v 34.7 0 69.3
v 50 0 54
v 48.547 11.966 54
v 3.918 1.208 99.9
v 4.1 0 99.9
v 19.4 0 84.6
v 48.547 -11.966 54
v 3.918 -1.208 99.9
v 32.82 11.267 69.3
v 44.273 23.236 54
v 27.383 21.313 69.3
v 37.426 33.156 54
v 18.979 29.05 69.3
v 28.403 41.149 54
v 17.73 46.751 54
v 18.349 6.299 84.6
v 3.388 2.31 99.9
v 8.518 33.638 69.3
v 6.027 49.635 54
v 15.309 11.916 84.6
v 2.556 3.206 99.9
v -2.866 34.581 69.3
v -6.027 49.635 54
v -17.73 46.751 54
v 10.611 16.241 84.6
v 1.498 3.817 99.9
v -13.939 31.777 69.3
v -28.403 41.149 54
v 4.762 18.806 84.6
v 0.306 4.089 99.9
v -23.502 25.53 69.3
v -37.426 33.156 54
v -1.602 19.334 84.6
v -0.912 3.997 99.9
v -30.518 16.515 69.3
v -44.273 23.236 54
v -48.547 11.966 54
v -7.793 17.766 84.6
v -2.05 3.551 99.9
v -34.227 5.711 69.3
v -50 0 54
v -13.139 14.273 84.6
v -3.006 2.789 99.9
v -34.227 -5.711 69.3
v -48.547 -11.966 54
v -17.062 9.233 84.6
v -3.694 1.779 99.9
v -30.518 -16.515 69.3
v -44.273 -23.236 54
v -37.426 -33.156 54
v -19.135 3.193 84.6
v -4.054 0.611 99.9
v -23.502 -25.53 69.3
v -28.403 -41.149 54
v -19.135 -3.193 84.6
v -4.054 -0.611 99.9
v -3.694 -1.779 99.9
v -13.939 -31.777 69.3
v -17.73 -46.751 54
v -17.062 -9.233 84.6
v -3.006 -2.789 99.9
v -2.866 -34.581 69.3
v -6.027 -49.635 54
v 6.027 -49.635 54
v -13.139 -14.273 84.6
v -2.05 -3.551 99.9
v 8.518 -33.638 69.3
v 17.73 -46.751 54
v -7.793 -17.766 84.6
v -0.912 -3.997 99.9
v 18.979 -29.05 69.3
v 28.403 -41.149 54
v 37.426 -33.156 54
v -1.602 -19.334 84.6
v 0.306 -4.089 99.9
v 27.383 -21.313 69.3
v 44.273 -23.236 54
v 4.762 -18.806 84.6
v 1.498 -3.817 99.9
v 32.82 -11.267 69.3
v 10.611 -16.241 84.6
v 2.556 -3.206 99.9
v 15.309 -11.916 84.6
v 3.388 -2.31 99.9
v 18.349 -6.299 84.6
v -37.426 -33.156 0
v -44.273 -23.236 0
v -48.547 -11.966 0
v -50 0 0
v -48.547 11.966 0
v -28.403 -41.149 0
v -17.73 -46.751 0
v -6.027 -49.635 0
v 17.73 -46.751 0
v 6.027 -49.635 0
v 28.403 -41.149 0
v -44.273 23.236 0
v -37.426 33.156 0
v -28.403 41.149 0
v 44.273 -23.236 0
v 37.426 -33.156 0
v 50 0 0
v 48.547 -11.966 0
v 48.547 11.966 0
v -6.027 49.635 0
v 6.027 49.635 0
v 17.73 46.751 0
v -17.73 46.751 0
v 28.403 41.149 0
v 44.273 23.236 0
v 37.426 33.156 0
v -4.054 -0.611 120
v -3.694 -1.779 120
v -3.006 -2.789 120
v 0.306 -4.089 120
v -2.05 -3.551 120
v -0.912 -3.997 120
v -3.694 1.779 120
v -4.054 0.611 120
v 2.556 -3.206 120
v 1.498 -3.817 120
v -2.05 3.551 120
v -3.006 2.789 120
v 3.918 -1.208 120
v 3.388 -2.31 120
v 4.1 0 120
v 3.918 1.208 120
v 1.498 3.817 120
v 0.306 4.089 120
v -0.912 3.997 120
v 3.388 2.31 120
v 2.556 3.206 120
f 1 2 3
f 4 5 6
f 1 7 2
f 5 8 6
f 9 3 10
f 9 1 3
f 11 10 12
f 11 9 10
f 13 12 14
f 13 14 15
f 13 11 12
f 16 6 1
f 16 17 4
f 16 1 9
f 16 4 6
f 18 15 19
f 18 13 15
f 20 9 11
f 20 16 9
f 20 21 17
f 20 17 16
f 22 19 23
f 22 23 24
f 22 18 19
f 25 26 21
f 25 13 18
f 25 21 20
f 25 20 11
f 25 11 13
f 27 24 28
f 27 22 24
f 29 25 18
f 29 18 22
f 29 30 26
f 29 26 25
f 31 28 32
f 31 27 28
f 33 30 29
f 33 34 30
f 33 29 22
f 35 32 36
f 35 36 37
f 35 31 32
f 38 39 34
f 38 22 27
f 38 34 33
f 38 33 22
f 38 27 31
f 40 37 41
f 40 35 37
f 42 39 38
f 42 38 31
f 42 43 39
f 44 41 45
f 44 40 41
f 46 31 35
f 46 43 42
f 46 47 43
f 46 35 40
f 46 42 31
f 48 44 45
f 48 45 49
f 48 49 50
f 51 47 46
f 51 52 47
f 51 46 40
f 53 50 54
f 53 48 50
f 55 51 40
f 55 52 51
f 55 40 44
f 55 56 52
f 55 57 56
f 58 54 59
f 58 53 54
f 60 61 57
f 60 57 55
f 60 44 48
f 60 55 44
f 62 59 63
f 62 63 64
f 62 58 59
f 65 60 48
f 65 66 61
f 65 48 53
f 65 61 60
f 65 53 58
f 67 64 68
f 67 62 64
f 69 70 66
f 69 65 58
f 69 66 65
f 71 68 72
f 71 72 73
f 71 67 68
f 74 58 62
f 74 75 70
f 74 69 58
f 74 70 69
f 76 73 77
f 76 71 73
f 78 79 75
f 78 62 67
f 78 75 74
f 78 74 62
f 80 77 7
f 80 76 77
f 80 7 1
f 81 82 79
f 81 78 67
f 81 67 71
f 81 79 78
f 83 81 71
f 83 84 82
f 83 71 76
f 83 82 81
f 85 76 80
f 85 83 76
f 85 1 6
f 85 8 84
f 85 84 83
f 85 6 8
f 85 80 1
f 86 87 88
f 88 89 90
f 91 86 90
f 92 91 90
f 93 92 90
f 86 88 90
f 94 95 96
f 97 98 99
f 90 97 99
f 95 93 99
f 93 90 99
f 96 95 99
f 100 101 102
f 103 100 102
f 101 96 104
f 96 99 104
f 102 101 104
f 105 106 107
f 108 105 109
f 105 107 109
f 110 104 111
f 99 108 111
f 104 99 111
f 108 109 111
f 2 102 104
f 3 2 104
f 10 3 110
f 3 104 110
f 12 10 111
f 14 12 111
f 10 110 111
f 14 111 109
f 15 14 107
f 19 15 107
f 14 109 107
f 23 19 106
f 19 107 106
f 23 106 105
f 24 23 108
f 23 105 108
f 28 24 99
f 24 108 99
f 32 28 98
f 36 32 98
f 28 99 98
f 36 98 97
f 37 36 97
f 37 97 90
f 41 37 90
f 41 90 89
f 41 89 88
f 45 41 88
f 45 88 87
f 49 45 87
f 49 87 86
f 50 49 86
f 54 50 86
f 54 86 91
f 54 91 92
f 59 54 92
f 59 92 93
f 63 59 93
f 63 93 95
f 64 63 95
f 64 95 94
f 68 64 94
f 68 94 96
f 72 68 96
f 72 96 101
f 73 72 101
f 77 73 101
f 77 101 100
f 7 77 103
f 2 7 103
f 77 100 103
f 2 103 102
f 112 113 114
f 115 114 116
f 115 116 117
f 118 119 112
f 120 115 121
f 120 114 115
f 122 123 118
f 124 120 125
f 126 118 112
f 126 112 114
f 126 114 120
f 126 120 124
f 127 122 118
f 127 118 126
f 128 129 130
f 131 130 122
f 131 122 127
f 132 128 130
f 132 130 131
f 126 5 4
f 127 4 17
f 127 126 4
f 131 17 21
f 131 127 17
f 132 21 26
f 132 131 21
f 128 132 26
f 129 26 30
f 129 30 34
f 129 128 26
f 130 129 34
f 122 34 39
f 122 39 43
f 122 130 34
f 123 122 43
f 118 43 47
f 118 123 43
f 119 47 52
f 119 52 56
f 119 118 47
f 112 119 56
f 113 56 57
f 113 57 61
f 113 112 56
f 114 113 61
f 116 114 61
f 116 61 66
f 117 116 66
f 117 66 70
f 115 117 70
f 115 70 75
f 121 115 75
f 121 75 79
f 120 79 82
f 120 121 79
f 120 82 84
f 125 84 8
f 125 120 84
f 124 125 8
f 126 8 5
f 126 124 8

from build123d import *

# Parameters (mm, degrees)
F0_R        = 50
F1_DEPTH    = 100
F2_R        = 4.1
F3_DEPTH    = 20
F4_S5_R     = 4.1
F4_T6_DEPTH = 76


# Not quite as in the source:
# - a fillet or chamfer that OpenCascade refuses, or shapes differently, is made with other operations: its cross-section is extruded or revolved along the edge and cut away or added


with BuildPart() as f1:
    # F0 (on Top) → F1 (new body)
    with BuildSketch(Plane.XY):
        Circle(F0_R)
    extrude(amount=F1_DEPTH)

    # F2 (on face) → F3 (join)
    with BuildSketch(Plane.XY.offset(100)):
        Circle(F2_R)
    extrude(amount=F3_DEPTH)

    # F4: chamfer of 46 on 1 edges, made by hand


with BuildPart() as f4_tool2:
    # F4_s3 → F4_t4 (revolve)
    with BuildSketch(Plane.XZ):
        Polygon((50, 54), (4, 100), (50, 100), align=None)
    revolve(axis=Axis((0, 0, 100), (0, 0, 1)))

    # F4_s5 → F4_t6 (cut, symmetric)
    with BuildSketch(Plane.XY.offset(77)):
        Circle(F4_S5_R)
    extrude(amount=F4_T6_DEPTH, both=True, mode=Mode.SUBTRACT)


with BuildPart() as f1_1:
    add(f1.part)

    # F4_t1: cut F4_tool2
    add(f4_tool2.part, mode=Mode.SUBTRACT)


solid = f1_1.part
